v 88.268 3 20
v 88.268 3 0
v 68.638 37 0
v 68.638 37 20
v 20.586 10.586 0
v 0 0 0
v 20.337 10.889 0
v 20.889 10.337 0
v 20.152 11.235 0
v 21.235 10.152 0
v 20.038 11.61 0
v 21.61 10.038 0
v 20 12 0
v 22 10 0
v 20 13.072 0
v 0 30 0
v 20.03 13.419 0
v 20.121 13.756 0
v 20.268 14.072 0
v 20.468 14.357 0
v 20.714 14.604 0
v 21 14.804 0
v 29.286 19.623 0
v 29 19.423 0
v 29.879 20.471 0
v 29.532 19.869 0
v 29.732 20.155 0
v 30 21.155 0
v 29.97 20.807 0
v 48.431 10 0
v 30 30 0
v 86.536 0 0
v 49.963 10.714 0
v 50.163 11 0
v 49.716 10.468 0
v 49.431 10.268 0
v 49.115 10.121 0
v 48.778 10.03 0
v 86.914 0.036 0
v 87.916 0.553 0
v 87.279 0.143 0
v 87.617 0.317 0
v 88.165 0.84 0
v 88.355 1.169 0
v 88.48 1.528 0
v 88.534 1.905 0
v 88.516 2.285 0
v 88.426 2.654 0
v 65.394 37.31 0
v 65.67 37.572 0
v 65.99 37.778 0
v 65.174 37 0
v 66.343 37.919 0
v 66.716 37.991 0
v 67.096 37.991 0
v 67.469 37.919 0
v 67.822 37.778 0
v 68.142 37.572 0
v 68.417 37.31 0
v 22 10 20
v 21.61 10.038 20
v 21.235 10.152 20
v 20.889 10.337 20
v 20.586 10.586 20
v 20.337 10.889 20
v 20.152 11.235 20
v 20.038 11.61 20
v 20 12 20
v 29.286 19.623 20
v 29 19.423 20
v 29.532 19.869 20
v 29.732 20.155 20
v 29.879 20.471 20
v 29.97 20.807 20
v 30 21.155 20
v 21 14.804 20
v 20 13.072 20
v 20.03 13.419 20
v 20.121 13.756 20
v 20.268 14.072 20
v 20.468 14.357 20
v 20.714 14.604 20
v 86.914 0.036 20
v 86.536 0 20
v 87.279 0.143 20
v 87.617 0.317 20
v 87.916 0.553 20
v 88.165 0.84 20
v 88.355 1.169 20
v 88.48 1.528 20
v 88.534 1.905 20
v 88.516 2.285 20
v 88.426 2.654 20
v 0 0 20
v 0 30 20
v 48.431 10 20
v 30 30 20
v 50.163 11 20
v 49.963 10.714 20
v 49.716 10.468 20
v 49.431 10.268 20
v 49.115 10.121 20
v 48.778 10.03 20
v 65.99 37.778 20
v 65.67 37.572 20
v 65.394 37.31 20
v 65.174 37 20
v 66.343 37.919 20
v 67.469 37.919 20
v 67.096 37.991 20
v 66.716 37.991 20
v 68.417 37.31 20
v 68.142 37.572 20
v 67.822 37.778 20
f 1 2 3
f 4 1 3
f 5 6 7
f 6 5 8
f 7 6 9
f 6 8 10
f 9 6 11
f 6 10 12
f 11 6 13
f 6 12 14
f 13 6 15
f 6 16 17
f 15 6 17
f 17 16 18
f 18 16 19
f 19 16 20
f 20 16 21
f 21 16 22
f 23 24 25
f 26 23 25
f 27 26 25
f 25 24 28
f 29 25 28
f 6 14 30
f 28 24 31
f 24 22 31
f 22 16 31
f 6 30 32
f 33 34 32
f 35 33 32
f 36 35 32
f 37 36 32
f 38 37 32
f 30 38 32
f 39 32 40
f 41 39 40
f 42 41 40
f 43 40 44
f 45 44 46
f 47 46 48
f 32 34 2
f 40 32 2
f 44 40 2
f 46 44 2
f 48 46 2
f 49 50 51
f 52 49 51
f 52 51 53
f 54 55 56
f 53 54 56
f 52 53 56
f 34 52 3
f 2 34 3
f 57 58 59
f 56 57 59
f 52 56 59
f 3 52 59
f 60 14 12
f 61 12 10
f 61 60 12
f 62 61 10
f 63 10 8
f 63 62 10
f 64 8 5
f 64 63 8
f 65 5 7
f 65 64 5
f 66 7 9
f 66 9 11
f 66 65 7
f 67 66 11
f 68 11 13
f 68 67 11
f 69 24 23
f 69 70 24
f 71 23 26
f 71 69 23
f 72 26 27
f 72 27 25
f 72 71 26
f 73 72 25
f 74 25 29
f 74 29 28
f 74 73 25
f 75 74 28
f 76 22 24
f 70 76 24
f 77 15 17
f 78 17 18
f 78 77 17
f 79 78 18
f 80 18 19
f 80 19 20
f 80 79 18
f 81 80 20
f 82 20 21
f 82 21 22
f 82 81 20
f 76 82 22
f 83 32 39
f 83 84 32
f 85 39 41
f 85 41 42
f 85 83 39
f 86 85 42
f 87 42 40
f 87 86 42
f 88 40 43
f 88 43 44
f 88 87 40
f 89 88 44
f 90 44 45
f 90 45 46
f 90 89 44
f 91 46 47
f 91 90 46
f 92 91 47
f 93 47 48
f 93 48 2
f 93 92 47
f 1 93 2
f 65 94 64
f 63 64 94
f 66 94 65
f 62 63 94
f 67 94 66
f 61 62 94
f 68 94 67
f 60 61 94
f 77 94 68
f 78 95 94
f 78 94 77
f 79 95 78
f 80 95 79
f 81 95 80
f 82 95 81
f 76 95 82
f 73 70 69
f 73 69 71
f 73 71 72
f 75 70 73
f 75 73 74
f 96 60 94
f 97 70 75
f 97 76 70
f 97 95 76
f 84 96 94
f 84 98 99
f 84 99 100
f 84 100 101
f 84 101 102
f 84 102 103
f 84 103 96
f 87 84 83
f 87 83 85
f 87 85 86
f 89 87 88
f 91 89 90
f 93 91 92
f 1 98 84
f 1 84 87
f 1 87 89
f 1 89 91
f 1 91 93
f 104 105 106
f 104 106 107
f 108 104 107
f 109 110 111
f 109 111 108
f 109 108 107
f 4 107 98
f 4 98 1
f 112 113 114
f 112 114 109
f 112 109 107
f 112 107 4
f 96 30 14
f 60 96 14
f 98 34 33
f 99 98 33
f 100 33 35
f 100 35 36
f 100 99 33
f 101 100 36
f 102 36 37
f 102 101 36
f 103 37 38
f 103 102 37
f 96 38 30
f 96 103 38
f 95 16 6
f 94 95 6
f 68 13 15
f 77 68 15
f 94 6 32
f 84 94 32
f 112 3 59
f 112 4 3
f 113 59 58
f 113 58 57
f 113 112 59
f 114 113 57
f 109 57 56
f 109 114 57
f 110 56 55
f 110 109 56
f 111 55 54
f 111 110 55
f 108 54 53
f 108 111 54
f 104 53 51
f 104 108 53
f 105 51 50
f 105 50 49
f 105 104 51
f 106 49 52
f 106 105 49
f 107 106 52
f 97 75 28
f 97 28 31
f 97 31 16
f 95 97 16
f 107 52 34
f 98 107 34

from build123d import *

# Parameters (mm, degrees)
BOSS_EXTRUDE1_DEPTH = 20
FILLET1_R           = 2


with BuildPart() as part:
    # Sketch1 → Boss-Extrude1 (new body)
    with BuildSketch(Plane.XY):
        Polygon((0, 0), (90, 0), (66.905989232, 40), (49.585481157, 10), (20, 10), (20, 14.226497308), (30, 20), (30, 30), (0, 30), align=None)
    extrude(amount=BOSS_EXTRUDE1_DEPTH)

    # Fillet1
    fillet1_edges = [part.edges().sort_by_distance(p)[0] for p in [
        (30, 20, 10),
        (20, 14.226497308, 10),
        (20, 10, 10),
        (49.585481157, 10, 10),
        (66.905989232, 40, 10),
        (90, 0, 10),
    ]]
    fillet(fillet1_edges, radius=FILLET1_R)


solid = part.part
